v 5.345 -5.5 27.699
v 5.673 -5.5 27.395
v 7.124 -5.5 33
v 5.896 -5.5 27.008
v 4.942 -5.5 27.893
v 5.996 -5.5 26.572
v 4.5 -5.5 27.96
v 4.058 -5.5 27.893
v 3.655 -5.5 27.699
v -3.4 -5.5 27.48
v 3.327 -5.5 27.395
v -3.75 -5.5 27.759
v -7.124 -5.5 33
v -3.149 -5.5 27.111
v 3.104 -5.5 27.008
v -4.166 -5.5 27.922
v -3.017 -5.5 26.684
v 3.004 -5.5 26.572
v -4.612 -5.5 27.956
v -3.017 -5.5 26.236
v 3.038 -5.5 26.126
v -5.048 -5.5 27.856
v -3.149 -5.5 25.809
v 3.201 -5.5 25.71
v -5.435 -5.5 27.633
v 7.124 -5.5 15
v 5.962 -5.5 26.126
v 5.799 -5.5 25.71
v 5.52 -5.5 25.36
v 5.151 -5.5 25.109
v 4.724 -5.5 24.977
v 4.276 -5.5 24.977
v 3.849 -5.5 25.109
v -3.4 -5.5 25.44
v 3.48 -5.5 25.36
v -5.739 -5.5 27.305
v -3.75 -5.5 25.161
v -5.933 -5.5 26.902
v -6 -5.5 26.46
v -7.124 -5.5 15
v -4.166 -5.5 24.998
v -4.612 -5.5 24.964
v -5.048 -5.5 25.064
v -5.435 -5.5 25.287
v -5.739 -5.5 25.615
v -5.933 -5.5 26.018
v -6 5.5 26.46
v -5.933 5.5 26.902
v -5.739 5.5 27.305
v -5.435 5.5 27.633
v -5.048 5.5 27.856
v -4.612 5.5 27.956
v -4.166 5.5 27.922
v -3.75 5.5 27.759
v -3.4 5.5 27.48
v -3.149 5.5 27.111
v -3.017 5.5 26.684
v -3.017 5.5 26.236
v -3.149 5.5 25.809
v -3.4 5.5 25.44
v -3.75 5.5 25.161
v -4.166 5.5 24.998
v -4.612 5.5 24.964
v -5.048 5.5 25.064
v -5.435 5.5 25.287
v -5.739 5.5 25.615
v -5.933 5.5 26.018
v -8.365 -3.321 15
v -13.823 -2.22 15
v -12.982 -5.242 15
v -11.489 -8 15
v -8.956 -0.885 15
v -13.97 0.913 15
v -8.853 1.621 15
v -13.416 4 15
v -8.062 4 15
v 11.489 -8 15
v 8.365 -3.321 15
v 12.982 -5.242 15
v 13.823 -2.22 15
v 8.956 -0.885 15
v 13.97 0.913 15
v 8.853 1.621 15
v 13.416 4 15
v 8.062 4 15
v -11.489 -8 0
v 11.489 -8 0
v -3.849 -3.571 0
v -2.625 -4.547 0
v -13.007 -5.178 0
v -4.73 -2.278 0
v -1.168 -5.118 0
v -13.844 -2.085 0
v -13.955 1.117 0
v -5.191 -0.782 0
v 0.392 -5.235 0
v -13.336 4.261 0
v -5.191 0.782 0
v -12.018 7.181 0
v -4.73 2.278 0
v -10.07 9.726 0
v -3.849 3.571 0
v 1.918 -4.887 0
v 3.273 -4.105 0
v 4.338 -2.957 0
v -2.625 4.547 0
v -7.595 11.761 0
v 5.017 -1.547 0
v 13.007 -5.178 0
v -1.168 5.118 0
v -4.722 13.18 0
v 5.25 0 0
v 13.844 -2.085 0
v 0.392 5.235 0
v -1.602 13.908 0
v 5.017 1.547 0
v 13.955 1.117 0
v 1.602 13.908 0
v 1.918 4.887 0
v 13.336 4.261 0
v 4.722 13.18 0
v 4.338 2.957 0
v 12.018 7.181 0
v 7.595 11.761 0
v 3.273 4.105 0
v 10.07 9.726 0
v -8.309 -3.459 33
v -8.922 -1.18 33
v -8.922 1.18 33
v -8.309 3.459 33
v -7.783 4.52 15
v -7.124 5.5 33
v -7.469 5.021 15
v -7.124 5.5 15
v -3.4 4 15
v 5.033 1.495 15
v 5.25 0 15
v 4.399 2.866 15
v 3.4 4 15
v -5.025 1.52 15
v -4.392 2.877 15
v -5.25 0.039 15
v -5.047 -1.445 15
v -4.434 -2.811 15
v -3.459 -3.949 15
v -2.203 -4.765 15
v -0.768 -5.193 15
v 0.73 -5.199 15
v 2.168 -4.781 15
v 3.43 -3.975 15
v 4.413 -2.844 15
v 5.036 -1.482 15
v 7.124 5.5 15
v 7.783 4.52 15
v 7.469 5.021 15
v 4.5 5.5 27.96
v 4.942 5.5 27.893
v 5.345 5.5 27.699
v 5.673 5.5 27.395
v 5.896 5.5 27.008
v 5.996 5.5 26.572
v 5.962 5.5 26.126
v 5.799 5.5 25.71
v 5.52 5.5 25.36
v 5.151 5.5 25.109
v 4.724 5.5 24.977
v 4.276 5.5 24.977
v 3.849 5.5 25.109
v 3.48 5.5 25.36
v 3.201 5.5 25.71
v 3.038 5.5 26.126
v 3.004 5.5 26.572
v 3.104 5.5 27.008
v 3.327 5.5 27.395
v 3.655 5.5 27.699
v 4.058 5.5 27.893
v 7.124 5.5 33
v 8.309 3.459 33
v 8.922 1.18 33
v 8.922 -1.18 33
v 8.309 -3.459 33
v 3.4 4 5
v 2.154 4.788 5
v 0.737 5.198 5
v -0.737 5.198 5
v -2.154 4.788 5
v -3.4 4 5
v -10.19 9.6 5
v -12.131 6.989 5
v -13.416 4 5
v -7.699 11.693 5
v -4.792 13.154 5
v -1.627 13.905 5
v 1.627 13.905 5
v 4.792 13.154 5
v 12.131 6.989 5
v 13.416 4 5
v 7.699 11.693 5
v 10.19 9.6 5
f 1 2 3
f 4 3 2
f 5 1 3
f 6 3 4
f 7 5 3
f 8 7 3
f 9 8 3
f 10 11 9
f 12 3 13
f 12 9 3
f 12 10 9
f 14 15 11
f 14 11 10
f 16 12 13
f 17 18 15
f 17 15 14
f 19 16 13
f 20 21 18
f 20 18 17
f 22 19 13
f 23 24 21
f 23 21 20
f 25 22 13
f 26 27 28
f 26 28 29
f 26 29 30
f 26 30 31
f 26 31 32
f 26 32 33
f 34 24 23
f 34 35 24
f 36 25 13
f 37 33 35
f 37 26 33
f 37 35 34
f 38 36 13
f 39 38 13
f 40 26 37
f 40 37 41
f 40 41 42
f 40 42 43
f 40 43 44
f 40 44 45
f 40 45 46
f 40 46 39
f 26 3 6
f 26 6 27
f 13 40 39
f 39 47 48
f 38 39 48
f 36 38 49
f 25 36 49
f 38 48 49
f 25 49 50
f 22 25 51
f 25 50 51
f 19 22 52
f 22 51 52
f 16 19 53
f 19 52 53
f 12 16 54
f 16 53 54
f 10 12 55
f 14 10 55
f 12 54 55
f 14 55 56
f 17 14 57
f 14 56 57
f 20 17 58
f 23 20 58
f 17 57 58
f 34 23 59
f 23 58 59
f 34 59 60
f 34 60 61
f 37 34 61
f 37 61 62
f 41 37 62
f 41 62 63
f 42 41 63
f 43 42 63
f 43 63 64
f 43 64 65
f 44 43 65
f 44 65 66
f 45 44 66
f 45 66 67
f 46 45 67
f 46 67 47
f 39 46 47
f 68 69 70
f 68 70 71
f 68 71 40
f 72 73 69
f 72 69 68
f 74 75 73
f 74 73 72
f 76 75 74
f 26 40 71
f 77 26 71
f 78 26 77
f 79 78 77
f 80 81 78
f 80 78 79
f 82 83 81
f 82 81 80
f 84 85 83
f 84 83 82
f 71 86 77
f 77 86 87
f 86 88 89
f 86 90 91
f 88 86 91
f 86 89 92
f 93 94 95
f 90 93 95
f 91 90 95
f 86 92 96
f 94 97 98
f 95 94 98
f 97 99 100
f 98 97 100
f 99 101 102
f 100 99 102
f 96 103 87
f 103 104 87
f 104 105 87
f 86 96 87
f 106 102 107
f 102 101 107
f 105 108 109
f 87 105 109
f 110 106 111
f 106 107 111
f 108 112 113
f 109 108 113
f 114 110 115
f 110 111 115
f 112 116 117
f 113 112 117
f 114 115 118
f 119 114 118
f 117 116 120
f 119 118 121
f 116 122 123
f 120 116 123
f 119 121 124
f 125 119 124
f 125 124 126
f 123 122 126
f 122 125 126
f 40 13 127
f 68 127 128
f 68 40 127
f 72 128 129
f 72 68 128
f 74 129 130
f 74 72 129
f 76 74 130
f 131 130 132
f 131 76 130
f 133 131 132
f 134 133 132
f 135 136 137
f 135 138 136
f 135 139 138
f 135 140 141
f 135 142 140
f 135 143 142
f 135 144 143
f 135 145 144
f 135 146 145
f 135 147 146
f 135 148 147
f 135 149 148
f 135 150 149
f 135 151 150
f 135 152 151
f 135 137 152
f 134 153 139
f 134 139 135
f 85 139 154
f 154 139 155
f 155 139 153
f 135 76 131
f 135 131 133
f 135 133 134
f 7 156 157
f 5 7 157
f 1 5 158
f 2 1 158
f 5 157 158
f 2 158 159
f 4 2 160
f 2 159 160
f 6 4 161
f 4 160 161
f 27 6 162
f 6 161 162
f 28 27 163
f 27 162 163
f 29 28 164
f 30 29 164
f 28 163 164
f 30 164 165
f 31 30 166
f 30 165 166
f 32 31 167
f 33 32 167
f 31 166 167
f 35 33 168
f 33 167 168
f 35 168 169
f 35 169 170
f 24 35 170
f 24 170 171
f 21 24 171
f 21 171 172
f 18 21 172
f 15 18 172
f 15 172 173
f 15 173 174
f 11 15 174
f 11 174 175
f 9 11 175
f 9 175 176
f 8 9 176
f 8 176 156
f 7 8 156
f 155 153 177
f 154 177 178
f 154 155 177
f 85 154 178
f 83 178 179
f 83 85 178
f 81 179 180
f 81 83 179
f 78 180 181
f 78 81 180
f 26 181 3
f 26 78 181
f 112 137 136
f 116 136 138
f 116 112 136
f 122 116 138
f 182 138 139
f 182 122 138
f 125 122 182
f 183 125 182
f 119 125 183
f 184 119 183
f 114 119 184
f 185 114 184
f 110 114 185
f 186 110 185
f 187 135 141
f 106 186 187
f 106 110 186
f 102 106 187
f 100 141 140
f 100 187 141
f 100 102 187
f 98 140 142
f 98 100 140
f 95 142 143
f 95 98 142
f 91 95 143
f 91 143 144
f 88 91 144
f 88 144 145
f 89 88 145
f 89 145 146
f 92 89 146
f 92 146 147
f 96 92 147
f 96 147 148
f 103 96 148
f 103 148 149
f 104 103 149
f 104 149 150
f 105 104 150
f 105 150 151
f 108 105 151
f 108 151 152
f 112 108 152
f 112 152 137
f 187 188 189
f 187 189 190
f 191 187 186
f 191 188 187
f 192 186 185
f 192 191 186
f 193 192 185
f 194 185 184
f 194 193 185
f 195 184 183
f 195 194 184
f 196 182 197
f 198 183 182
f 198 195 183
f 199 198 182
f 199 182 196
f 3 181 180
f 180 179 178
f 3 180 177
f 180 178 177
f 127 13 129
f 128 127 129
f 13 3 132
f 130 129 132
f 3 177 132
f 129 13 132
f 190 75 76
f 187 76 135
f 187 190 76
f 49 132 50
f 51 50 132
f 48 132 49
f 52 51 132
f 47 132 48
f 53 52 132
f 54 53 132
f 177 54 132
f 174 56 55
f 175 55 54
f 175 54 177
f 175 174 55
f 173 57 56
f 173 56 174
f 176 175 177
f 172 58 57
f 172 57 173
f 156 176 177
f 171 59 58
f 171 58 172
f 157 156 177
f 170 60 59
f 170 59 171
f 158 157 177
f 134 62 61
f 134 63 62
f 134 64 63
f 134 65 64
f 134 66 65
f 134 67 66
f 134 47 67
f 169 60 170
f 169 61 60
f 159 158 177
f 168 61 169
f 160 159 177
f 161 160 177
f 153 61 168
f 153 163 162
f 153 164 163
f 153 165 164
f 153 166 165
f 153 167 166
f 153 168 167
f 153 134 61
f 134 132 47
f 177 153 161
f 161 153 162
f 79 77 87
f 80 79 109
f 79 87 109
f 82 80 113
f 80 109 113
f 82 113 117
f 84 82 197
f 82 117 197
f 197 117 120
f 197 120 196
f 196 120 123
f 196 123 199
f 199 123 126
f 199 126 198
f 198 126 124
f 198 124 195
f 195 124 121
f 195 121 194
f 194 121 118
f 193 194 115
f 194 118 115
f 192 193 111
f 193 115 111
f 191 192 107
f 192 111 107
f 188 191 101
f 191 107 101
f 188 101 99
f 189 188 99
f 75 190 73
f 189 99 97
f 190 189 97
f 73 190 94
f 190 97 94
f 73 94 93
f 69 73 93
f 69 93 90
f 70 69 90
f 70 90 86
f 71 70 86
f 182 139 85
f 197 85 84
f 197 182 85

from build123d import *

# Parameters (mm, degrees)
SKETCH_1_R          = 5.25
EXTRUDE_1_DEPTH     = 15
CUT_EXTRUDE_START   = -10
CUT_EXTRUDE_1_DEPTH = 10
EXTRUDE_2_DEPTH     = 18
SKETCH_4_R          = 1.5
CUT_EXTRUDE_2_DEPTH = 39.304699451


with BuildPart() as part:
    # 草图1 → 凸台-拉伸1 (new body)
    with BuildSketch(Plane.XY):
        with BuildLine():
            Line((-11.489125293, -8), (11.489125293, -8))
            ThreePointArc((11.489125293, -8), (0, 14), (-11.489125293, -8))
        make_face()
        Circle(SKETCH_1_R, mode=Mode.SUBTRACT)
    extrude(amount=EXTRUDE_1_DEPTH)

    # 草图2 → 切除-拉伸1 (cut)
    with BuildSketch(Plane.XY.offset(15).offset(CUT_EXTRUDE_START)):
        with BuildLine():
            Line((-13.416407865, 4), (13.416407865, 4))
            ThreePointArc((13.416407865, 4), (0, 14), (-13.416407865, 4))
        make_face()
    extrude(amount=CUT_EXTRUDE_1_DEPTH, mode=Mode.SUBTRACT)

    # 草图3 → 凸台-拉伸2 (add)
    with BuildSketch(Plane.XY.offset(15)):
        with BuildLine():
            Line((-7.123903424, 5.5), (7.123903424, 5.5))
            ThreePointArc((7.123903424, 5.5), (9, 0), (7.123903424, -5.5))
            Line((7.123903424, -5.5), (-7.123903424, -5.5))
            ThreePointArc((-7.123903424, -5.5), (-9, 0), (-7.123903424, 5.5))
        make_face()
    extrude(amount=EXTRUDE_2_DEPTH)

    # 草图4 → 切除-拉伸2 (cut, through all)
    with BuildSketch(Plane(origin=(0, 5.5, 0), x_dir=(1, 0, 0), z_dir=(0, 1, 0))):
        with Locations(Location((4.5, -26.46, 0), (0, 0, 270))):
            Circle(SKETCH_4_R)
        with Locations(Location((-4.5, -26.46, 0), (0, 0, 180))):
            Circle(SKETCH_4_R)
    extrude(amount=-CUT_EXTRUDE_2_DEPTH, mode=Mode.SUBTRACT)


solid = part.part
